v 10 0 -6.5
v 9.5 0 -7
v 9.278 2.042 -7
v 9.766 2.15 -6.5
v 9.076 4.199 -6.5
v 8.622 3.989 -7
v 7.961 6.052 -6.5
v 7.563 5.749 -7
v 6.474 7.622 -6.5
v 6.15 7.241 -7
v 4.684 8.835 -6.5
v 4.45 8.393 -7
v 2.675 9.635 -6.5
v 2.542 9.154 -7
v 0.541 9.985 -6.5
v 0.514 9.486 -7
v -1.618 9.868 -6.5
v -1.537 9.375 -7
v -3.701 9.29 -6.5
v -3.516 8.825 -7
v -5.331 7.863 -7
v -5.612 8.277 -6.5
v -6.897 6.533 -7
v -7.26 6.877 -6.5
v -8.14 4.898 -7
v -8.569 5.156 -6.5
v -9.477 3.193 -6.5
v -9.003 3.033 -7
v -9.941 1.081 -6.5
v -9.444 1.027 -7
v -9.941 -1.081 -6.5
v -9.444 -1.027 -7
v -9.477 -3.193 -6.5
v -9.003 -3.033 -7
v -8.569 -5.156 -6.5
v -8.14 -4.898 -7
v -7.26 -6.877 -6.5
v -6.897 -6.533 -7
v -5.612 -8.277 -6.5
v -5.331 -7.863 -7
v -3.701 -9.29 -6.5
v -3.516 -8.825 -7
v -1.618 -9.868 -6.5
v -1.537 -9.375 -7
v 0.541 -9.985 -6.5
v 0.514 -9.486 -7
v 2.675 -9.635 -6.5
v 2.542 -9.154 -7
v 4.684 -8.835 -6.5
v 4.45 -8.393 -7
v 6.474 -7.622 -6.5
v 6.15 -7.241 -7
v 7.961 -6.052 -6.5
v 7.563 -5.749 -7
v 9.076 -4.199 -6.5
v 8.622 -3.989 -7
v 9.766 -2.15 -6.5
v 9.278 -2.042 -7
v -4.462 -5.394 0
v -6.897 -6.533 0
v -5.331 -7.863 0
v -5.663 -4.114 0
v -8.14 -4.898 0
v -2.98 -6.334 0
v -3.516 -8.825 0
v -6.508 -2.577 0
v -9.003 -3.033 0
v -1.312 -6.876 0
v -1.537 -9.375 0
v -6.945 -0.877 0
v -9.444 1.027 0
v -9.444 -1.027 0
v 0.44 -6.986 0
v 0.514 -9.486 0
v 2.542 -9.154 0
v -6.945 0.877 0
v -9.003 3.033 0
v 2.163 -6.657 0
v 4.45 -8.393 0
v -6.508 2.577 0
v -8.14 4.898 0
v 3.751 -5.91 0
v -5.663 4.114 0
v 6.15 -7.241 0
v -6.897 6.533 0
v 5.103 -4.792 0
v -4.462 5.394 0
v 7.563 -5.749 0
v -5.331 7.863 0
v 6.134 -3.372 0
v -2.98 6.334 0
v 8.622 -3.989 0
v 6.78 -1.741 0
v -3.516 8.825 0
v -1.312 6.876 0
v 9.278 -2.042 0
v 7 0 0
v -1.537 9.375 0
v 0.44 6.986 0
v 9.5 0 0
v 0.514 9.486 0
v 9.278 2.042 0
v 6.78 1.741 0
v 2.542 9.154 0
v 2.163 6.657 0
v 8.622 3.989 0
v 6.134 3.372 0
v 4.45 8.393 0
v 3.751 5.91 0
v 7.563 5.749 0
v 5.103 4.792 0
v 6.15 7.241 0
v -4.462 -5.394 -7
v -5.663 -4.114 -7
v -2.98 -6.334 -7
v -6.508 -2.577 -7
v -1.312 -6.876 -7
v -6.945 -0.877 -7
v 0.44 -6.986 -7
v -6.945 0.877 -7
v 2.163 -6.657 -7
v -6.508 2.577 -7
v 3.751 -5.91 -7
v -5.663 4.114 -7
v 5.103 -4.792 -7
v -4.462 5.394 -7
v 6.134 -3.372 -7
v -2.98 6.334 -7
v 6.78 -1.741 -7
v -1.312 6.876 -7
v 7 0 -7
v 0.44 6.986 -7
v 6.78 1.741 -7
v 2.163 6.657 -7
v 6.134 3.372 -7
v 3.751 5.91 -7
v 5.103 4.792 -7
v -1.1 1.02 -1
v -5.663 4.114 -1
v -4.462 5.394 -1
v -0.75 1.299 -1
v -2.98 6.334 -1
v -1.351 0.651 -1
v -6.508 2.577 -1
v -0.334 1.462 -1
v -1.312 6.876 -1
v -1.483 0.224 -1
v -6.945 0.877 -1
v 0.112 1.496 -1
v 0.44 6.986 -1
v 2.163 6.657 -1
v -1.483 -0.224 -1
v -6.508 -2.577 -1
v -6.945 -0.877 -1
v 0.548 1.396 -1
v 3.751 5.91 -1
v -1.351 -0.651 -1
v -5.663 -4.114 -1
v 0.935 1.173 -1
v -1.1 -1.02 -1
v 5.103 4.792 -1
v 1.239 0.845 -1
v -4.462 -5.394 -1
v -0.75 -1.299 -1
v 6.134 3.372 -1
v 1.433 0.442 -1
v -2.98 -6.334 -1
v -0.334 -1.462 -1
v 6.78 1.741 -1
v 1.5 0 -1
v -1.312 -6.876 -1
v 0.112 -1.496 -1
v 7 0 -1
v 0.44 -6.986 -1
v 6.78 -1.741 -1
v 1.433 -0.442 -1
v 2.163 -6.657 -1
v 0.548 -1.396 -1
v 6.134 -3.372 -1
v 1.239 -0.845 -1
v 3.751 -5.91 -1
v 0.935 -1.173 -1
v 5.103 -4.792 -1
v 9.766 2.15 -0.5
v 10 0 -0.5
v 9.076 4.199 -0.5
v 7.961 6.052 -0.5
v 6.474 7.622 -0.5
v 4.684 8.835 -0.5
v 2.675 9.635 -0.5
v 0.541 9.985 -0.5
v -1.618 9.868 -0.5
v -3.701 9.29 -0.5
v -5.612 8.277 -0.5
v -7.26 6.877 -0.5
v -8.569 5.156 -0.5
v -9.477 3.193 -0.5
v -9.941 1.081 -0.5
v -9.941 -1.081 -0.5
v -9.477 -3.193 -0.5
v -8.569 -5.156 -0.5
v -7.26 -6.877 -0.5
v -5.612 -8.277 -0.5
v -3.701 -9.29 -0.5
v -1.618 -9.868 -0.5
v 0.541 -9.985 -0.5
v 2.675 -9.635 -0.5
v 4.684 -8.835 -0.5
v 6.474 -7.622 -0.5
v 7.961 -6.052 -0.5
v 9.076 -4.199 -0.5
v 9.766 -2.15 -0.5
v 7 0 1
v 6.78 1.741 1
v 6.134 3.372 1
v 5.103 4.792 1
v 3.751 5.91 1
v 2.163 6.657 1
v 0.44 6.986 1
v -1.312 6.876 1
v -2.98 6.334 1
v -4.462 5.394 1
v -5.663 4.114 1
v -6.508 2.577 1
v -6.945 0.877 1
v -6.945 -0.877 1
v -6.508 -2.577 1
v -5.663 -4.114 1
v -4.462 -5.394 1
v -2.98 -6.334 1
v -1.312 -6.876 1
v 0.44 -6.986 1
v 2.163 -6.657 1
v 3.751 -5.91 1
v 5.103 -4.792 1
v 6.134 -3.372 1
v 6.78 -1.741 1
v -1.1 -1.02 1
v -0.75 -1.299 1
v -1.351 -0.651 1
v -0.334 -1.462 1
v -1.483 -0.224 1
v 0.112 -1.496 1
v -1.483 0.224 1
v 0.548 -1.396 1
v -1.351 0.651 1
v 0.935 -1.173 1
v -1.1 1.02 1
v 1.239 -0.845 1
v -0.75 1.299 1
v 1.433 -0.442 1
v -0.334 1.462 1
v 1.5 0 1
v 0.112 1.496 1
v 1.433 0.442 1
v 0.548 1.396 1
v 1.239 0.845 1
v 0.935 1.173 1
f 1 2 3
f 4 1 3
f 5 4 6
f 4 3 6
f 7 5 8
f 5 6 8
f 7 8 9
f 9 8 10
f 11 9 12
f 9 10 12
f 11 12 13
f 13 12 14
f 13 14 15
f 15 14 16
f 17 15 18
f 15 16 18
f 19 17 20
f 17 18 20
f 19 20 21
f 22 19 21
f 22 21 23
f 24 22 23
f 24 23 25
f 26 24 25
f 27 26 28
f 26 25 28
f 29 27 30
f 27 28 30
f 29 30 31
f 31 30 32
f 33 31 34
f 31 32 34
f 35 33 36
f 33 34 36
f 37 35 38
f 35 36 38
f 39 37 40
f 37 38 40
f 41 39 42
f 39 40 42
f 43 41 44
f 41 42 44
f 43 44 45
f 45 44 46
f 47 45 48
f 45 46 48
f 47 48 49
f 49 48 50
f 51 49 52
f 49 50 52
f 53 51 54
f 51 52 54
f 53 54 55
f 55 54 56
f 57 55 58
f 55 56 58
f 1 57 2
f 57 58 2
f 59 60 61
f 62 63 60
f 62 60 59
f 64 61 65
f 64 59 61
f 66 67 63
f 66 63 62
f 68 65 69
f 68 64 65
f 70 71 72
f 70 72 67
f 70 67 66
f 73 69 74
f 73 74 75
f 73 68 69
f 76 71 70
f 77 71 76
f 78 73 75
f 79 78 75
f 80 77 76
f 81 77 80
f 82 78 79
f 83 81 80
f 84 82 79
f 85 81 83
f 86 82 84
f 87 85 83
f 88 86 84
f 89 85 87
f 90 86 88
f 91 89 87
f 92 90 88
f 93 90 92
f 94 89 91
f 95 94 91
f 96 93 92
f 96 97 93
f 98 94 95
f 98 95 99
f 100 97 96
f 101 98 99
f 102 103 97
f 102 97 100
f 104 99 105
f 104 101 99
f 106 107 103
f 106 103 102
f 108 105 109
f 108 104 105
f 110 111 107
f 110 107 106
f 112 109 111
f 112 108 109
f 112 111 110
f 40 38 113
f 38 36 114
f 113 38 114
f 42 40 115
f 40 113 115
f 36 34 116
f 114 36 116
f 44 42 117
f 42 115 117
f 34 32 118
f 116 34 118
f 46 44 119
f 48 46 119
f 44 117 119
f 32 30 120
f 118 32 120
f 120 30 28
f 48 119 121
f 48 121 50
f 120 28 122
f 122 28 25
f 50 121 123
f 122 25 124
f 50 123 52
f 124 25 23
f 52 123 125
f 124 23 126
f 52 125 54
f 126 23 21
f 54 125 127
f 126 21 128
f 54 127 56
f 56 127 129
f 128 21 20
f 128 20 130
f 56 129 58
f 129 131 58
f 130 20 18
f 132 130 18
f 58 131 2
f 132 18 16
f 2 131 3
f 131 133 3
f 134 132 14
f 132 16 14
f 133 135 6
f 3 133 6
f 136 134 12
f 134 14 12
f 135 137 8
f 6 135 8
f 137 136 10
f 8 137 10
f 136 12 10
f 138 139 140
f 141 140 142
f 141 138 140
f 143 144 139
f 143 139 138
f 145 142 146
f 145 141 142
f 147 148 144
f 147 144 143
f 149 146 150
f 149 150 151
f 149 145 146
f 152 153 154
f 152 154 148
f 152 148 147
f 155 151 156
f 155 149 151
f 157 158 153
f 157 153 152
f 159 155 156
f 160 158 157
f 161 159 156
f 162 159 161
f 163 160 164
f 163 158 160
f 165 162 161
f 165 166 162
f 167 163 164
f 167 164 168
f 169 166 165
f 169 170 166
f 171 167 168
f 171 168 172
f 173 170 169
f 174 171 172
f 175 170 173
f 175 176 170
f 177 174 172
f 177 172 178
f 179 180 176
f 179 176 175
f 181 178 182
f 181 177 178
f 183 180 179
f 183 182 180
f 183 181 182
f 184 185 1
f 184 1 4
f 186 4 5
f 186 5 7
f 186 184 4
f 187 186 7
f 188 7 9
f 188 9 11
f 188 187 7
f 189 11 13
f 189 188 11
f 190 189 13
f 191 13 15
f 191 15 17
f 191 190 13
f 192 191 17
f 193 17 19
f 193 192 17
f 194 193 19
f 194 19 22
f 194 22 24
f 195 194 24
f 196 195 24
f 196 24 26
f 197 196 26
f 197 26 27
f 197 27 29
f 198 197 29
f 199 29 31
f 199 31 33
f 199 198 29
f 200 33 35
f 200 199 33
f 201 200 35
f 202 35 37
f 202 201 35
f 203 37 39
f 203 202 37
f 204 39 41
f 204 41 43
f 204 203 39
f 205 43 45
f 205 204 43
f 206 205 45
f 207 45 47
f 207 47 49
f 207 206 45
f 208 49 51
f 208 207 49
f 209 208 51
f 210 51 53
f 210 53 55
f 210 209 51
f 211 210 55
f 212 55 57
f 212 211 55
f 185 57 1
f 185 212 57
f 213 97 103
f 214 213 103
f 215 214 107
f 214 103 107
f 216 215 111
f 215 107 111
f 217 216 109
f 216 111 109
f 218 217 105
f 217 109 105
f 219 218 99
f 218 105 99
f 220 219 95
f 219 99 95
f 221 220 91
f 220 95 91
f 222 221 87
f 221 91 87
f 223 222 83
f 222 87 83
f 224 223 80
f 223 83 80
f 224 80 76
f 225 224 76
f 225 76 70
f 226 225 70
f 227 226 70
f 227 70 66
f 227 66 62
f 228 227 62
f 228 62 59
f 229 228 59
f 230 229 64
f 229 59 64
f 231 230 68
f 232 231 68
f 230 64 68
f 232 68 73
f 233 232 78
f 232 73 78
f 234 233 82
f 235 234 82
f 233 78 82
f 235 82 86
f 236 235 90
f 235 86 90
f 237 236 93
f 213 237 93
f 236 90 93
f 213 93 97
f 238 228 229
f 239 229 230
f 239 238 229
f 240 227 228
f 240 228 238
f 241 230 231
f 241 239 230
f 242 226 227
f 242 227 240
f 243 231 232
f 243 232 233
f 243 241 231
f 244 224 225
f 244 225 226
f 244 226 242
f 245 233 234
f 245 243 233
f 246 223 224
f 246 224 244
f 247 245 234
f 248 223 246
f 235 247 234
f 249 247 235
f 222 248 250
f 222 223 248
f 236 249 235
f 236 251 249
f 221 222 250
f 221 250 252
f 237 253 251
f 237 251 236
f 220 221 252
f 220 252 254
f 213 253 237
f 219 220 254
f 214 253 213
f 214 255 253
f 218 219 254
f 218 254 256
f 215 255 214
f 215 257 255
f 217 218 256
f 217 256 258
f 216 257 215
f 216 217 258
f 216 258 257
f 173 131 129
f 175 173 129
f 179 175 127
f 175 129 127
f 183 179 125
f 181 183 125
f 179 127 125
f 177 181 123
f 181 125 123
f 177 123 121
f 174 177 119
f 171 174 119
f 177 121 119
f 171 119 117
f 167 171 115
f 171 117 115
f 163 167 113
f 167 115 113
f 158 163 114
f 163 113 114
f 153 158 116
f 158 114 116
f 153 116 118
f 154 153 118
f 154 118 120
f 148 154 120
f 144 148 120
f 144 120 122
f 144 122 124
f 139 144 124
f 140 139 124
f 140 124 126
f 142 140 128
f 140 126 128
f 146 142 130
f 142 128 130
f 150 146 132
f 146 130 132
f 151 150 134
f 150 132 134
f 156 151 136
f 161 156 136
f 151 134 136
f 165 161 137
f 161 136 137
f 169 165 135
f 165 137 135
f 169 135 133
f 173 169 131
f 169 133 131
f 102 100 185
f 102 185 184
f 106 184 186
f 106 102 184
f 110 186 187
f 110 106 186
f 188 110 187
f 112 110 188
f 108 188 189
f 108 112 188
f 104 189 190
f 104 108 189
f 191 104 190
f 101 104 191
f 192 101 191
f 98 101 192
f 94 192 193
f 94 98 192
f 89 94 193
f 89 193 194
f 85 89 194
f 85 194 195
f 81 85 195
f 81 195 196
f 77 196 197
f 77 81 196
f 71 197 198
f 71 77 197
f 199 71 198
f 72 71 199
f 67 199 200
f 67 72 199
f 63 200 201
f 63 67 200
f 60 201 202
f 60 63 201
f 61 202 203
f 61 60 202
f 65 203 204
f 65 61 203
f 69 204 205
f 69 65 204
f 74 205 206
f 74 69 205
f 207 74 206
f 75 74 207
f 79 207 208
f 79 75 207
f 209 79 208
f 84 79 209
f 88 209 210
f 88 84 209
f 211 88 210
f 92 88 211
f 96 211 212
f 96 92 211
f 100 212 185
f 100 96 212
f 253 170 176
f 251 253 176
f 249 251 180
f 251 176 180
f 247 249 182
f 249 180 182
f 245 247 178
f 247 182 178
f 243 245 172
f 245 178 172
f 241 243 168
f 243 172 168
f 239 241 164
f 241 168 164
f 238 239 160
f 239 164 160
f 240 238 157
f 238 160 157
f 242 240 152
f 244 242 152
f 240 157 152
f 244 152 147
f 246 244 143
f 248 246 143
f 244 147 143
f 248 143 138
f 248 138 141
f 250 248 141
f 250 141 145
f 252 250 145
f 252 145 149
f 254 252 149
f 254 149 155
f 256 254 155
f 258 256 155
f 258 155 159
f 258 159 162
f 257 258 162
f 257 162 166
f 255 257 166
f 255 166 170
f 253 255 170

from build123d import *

# Parameters (mm, degrees)
F0_R     = 7
F1_DEPTH = 1
F0_R_2   = 10
F2_DEPTH = 7
F3_SIZE  = 0.5
F4_R     = 7
F4_R_2   = 1.5
F5_DEPTH = 6
F6_DEPTH = 25


with BuildPart() as f1:
    # F0 (on Top) → F1 (new body)
    with BuildSketch(Plane.XY):
        Circle(F0_R)
    extrude(amount=F1_DEPTH)

    # F0 (on Top) → F2 (join)
    with BuildSketch(Plane.XY):
        Circle(F0_R_2)
        Circle(F0_R, mode=Mode.SUBTRACT)
        Circle(F0_R)
    extrude(amount=-F2_DEPTH)

    # F3
    f3_edges = [f1.edges().sort_by_distance(p)[0] for p in [
        (-10, 0, 0),
        (-10, 0, -7),
    ]]
    chamfer(f3_edges, length=F3_SIZE)

    # F4 (on face) → F5 (cut)
    with BuildSketch(Plane(origin=(0, 0, -7), x_dir=(1, 0, 0), z_dir=(0, 0, -1))):
        Circle(F4_R)
        Circle(F4_R_2, mode=Mode.SUBTRACT)
        Circle(F4_R_2)
    extrude(amount=-F5_DEPTH, mode=Mode.SUBTRACT)

    # F4 (on face) → F6 (cut)
    with BuildSketch(Plane(origin=(0, 0, -7), x_dir=(1, 0, 0), z_dir=(0, 0, -1))):
        Circle(F4_R_2)
    extrude(amount=-F6_DEPTH, mode=Mode.SUBTRACT)


solid = f1.part
